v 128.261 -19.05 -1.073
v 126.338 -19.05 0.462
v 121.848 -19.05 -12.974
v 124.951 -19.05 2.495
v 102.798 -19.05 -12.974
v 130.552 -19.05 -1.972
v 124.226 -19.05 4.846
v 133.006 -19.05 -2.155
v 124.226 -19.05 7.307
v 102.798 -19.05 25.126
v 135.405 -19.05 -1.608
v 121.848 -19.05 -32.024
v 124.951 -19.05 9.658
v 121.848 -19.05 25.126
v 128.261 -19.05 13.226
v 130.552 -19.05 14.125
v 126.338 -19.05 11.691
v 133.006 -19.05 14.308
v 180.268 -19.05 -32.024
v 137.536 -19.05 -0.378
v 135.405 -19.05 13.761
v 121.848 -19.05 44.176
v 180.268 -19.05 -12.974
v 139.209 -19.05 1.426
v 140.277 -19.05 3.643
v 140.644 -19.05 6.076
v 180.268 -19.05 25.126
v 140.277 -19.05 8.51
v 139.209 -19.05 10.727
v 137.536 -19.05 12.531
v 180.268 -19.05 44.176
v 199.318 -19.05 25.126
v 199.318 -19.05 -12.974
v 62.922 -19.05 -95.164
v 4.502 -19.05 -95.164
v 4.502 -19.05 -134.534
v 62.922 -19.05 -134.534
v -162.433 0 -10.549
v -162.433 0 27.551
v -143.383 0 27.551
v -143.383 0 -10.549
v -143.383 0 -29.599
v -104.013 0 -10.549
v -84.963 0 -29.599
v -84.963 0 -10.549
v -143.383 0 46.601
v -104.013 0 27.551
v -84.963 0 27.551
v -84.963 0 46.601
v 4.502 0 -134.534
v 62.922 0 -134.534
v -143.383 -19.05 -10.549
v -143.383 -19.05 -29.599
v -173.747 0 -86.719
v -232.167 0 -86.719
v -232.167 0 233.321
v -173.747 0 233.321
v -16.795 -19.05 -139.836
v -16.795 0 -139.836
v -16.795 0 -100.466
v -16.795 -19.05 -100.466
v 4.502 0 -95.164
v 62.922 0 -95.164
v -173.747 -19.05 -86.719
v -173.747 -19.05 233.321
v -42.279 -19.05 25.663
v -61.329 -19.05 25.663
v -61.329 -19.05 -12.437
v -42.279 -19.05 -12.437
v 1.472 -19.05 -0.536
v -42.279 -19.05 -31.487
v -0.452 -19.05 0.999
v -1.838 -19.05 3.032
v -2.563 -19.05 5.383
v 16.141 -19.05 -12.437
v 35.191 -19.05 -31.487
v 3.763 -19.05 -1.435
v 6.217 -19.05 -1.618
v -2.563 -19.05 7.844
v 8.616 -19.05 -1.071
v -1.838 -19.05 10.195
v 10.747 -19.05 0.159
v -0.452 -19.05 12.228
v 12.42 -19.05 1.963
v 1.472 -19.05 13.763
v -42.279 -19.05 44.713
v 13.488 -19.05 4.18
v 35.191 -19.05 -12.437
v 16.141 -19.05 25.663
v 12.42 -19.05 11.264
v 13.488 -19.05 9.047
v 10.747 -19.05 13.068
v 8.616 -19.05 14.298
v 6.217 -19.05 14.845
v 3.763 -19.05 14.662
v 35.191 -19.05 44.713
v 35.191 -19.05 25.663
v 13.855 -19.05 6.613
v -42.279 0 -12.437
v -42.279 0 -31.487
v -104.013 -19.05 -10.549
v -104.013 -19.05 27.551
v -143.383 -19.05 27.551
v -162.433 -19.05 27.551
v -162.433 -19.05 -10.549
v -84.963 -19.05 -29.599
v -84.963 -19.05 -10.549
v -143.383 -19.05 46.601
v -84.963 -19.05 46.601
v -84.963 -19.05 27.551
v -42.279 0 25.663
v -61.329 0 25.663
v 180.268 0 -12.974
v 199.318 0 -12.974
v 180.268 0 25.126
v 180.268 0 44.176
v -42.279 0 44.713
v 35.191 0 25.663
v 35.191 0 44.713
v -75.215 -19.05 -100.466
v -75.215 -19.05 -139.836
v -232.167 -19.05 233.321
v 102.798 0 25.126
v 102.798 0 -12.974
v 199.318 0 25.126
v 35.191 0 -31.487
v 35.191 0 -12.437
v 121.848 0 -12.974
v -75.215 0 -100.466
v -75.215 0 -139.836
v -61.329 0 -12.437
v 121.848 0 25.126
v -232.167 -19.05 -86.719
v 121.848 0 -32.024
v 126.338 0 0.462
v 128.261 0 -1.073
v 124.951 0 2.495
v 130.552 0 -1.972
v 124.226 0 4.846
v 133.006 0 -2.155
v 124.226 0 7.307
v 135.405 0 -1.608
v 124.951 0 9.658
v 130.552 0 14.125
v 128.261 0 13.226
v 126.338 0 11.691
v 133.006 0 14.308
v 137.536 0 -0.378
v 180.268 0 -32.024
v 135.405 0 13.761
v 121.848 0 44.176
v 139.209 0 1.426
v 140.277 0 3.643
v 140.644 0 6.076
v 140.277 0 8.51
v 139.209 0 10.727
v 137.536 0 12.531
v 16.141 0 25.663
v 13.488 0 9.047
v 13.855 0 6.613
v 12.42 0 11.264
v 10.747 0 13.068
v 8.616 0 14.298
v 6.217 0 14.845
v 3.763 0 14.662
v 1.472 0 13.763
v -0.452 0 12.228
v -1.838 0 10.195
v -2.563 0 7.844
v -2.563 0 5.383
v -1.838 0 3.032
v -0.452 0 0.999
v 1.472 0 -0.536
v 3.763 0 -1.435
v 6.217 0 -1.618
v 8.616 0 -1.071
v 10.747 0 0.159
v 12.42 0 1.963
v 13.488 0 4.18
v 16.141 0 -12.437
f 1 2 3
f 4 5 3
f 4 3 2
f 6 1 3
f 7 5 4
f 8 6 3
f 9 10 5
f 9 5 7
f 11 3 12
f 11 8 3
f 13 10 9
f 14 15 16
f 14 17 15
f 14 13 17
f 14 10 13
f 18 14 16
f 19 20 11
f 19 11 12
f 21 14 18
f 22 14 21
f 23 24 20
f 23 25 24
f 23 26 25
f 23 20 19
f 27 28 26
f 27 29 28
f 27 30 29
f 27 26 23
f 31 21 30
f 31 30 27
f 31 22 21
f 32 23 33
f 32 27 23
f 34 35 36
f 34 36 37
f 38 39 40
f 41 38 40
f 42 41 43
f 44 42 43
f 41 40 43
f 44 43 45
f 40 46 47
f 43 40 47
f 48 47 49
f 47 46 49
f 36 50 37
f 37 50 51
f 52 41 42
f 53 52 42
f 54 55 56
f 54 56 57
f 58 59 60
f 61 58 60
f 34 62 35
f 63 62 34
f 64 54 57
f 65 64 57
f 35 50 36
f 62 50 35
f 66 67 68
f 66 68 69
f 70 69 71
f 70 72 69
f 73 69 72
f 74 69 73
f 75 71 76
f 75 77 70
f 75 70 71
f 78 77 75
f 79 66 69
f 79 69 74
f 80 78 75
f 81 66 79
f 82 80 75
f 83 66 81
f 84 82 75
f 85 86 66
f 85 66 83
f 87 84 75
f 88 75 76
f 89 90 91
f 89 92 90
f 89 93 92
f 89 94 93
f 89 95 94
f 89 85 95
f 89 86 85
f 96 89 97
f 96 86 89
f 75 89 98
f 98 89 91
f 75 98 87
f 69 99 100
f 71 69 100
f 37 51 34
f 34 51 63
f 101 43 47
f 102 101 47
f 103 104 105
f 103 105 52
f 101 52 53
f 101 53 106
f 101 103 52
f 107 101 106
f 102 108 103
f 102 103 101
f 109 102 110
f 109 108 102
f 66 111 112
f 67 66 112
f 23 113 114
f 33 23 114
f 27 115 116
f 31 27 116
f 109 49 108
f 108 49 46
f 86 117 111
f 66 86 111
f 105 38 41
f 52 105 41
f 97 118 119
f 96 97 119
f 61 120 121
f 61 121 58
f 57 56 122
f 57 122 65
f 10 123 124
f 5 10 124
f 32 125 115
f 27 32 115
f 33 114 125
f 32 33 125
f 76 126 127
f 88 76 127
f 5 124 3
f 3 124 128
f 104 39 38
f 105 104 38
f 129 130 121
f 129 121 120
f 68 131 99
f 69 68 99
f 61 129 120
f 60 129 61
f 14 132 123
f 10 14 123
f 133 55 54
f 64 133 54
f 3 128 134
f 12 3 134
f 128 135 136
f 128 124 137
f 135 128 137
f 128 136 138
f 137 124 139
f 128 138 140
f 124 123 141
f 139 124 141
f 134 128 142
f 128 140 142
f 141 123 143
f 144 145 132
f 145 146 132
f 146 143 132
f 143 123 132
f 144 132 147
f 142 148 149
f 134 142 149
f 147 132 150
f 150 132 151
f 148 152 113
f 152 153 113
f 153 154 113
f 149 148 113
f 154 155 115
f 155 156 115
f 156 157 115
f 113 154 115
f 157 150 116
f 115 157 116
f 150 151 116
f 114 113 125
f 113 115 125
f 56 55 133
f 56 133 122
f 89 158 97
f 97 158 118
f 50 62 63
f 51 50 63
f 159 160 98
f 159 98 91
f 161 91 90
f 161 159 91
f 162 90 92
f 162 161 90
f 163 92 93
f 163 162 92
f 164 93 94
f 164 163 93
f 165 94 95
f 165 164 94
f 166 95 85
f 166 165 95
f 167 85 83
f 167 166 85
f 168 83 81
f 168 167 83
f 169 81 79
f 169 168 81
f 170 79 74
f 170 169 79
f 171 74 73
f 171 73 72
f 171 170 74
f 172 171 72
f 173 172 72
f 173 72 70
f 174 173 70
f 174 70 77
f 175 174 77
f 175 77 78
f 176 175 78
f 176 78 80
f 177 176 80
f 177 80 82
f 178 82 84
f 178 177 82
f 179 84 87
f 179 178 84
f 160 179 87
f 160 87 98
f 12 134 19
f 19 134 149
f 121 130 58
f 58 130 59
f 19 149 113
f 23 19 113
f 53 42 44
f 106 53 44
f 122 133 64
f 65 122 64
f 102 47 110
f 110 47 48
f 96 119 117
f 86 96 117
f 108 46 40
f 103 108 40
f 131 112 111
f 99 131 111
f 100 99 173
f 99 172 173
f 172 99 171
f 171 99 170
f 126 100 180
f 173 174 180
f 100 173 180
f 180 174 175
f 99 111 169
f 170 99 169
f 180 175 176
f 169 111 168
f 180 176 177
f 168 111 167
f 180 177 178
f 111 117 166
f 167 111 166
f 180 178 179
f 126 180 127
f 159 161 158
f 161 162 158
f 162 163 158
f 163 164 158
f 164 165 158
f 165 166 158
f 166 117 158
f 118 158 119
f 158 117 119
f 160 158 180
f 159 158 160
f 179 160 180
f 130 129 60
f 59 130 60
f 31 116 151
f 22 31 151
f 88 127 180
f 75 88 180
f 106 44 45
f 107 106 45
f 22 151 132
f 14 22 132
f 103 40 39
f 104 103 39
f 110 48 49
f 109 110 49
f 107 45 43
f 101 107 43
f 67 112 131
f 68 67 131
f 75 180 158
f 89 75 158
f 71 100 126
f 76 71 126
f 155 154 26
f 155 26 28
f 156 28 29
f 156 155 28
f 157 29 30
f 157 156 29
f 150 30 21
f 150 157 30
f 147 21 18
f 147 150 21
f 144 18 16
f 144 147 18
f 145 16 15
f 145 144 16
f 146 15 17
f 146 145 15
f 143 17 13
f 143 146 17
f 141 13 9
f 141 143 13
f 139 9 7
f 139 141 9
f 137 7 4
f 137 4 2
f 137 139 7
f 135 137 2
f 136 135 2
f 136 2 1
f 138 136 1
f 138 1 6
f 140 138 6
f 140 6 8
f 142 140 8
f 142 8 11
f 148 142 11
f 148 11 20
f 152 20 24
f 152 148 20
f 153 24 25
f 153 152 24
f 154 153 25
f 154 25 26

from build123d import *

# Parameters (mm, degrees)
F1_DEPTH = 19.05
F0_R     = 8.255
F0_W     = 58.42
F0_H     = 39.37
F0_H_2   = 320.04
F2_DEPTH = 19.05


# Not quite as in the source:
# - a feature names something its author has since deleted; it is built from what else it names


with BuildPart() as f1:
    # F0 (on Front) → F1 (new body)
    with BuildSketch(Plane.XZ):
        Polygon((-84.963388741, 46.6005802155), (-143.383388741, 46.6005802155), (-143.383388741, 27.5505802155), (-162.433388741, 27.5505802155), (-162.433388741, -10.5494197845), (-143.383388741, -10.5494197845), (-143.383388741, -29.5994197845), (-84.963388741, -29.5994197845), (-84.963388741, -10.5494197845), (-104.013388741, -10.5494197845), (-104.013388741, 27.5505802155), (-84.963388741, 27.5505802155), align=None)
    extrude(amount=F1_DEPTH)


with BuildPart() as f1b:
    # F0 (on Front) → F1, piece 2 (new body)
    with BuildSketch(Plane.XZ):
        Polygon((35.1907358062, 44.7134936616), (-42.2792641938, 44.7134936616), (-42.2792641938, 25.6634936616), (-61.3292641938, 25.6634936616), (-61.3292641938, -12.4365063384), (-42.2792641938, -12.4365063384), (-42.2792641938, -31.4865063384), (35.1907358062, -31.4865063384), (35.1907358062, -12.4365063384), (16.1407358062, -12.4365063384), (16.1407358062, 25.6634936616), (35.1907358062, 25.6634936616), align=None)
        with Locations((5.5997358062, 6.6134936616)):
            Circle(F0_R, mode=Mode.SUBTRACT)
    extrude(amount=F1_DEPTH)


with BuildPart() as f1c:
    # F0 (on Front) → F1, piece 3 (new body)
    with BuildSketch(Plane.XZ):
        Polygon((180.2678704262, 44.1764993489), (121.8478704262, 44.1764993489), (121.8478704262, 25.1264993489), (102.7978704262, 25.1264993489), (102.7978704262, -12.9735006511), (121.8478704262, -12.9735006511), (121.8478704262, -32.0235006511), (180.2678704262, -32.0235006511), (180.2678704262, -12.9735006511), (199.3178704262, -12.9735006511), (199.3178704262, 25.1264993489), (180.2678704262, 25.1264993489), align=None)
        with Locations((132.3888704262, 6.0764993489)):
            Circle(F0_R, mode=Mode.SUBTRACT)
    extrude(amount=F1_DEPTH)


with BuildPart() as f1d:
    # F0 (on Front) → F1, piece 4 (new body)
    with BuildSketch(Plane.XZ):
        with Locations((-46.0048330212, -120.1514003849)):
            Rectangle(F0_W, F0_H)
    extrude(amount=F1_DEPTH)


with BuildPart() as f1e:
    # F0 (on Front) → F1, piece 5 (new body)
    with BuildSketch(Plane.XZ):
        with Locations((33.7117160036, -114.8489843512)):
            Rectangle(F0_W, F0_H)
    extrude(amount=F1_DEPTH)


with BuildPart() as f2:
    # F0 (on Front) → F2 (new body)
    with BuildSketch(Plane.XZ):
        with Locations((-202.9565411425, 73.3008670402)):
            Rectangle(F0_W, F0_H_2)
    extrude(amount=F2_DEPTH)


solid = Compound([f1.part, f1b.part, f1c.part, f1d.part, f1e.part, f2.part])
